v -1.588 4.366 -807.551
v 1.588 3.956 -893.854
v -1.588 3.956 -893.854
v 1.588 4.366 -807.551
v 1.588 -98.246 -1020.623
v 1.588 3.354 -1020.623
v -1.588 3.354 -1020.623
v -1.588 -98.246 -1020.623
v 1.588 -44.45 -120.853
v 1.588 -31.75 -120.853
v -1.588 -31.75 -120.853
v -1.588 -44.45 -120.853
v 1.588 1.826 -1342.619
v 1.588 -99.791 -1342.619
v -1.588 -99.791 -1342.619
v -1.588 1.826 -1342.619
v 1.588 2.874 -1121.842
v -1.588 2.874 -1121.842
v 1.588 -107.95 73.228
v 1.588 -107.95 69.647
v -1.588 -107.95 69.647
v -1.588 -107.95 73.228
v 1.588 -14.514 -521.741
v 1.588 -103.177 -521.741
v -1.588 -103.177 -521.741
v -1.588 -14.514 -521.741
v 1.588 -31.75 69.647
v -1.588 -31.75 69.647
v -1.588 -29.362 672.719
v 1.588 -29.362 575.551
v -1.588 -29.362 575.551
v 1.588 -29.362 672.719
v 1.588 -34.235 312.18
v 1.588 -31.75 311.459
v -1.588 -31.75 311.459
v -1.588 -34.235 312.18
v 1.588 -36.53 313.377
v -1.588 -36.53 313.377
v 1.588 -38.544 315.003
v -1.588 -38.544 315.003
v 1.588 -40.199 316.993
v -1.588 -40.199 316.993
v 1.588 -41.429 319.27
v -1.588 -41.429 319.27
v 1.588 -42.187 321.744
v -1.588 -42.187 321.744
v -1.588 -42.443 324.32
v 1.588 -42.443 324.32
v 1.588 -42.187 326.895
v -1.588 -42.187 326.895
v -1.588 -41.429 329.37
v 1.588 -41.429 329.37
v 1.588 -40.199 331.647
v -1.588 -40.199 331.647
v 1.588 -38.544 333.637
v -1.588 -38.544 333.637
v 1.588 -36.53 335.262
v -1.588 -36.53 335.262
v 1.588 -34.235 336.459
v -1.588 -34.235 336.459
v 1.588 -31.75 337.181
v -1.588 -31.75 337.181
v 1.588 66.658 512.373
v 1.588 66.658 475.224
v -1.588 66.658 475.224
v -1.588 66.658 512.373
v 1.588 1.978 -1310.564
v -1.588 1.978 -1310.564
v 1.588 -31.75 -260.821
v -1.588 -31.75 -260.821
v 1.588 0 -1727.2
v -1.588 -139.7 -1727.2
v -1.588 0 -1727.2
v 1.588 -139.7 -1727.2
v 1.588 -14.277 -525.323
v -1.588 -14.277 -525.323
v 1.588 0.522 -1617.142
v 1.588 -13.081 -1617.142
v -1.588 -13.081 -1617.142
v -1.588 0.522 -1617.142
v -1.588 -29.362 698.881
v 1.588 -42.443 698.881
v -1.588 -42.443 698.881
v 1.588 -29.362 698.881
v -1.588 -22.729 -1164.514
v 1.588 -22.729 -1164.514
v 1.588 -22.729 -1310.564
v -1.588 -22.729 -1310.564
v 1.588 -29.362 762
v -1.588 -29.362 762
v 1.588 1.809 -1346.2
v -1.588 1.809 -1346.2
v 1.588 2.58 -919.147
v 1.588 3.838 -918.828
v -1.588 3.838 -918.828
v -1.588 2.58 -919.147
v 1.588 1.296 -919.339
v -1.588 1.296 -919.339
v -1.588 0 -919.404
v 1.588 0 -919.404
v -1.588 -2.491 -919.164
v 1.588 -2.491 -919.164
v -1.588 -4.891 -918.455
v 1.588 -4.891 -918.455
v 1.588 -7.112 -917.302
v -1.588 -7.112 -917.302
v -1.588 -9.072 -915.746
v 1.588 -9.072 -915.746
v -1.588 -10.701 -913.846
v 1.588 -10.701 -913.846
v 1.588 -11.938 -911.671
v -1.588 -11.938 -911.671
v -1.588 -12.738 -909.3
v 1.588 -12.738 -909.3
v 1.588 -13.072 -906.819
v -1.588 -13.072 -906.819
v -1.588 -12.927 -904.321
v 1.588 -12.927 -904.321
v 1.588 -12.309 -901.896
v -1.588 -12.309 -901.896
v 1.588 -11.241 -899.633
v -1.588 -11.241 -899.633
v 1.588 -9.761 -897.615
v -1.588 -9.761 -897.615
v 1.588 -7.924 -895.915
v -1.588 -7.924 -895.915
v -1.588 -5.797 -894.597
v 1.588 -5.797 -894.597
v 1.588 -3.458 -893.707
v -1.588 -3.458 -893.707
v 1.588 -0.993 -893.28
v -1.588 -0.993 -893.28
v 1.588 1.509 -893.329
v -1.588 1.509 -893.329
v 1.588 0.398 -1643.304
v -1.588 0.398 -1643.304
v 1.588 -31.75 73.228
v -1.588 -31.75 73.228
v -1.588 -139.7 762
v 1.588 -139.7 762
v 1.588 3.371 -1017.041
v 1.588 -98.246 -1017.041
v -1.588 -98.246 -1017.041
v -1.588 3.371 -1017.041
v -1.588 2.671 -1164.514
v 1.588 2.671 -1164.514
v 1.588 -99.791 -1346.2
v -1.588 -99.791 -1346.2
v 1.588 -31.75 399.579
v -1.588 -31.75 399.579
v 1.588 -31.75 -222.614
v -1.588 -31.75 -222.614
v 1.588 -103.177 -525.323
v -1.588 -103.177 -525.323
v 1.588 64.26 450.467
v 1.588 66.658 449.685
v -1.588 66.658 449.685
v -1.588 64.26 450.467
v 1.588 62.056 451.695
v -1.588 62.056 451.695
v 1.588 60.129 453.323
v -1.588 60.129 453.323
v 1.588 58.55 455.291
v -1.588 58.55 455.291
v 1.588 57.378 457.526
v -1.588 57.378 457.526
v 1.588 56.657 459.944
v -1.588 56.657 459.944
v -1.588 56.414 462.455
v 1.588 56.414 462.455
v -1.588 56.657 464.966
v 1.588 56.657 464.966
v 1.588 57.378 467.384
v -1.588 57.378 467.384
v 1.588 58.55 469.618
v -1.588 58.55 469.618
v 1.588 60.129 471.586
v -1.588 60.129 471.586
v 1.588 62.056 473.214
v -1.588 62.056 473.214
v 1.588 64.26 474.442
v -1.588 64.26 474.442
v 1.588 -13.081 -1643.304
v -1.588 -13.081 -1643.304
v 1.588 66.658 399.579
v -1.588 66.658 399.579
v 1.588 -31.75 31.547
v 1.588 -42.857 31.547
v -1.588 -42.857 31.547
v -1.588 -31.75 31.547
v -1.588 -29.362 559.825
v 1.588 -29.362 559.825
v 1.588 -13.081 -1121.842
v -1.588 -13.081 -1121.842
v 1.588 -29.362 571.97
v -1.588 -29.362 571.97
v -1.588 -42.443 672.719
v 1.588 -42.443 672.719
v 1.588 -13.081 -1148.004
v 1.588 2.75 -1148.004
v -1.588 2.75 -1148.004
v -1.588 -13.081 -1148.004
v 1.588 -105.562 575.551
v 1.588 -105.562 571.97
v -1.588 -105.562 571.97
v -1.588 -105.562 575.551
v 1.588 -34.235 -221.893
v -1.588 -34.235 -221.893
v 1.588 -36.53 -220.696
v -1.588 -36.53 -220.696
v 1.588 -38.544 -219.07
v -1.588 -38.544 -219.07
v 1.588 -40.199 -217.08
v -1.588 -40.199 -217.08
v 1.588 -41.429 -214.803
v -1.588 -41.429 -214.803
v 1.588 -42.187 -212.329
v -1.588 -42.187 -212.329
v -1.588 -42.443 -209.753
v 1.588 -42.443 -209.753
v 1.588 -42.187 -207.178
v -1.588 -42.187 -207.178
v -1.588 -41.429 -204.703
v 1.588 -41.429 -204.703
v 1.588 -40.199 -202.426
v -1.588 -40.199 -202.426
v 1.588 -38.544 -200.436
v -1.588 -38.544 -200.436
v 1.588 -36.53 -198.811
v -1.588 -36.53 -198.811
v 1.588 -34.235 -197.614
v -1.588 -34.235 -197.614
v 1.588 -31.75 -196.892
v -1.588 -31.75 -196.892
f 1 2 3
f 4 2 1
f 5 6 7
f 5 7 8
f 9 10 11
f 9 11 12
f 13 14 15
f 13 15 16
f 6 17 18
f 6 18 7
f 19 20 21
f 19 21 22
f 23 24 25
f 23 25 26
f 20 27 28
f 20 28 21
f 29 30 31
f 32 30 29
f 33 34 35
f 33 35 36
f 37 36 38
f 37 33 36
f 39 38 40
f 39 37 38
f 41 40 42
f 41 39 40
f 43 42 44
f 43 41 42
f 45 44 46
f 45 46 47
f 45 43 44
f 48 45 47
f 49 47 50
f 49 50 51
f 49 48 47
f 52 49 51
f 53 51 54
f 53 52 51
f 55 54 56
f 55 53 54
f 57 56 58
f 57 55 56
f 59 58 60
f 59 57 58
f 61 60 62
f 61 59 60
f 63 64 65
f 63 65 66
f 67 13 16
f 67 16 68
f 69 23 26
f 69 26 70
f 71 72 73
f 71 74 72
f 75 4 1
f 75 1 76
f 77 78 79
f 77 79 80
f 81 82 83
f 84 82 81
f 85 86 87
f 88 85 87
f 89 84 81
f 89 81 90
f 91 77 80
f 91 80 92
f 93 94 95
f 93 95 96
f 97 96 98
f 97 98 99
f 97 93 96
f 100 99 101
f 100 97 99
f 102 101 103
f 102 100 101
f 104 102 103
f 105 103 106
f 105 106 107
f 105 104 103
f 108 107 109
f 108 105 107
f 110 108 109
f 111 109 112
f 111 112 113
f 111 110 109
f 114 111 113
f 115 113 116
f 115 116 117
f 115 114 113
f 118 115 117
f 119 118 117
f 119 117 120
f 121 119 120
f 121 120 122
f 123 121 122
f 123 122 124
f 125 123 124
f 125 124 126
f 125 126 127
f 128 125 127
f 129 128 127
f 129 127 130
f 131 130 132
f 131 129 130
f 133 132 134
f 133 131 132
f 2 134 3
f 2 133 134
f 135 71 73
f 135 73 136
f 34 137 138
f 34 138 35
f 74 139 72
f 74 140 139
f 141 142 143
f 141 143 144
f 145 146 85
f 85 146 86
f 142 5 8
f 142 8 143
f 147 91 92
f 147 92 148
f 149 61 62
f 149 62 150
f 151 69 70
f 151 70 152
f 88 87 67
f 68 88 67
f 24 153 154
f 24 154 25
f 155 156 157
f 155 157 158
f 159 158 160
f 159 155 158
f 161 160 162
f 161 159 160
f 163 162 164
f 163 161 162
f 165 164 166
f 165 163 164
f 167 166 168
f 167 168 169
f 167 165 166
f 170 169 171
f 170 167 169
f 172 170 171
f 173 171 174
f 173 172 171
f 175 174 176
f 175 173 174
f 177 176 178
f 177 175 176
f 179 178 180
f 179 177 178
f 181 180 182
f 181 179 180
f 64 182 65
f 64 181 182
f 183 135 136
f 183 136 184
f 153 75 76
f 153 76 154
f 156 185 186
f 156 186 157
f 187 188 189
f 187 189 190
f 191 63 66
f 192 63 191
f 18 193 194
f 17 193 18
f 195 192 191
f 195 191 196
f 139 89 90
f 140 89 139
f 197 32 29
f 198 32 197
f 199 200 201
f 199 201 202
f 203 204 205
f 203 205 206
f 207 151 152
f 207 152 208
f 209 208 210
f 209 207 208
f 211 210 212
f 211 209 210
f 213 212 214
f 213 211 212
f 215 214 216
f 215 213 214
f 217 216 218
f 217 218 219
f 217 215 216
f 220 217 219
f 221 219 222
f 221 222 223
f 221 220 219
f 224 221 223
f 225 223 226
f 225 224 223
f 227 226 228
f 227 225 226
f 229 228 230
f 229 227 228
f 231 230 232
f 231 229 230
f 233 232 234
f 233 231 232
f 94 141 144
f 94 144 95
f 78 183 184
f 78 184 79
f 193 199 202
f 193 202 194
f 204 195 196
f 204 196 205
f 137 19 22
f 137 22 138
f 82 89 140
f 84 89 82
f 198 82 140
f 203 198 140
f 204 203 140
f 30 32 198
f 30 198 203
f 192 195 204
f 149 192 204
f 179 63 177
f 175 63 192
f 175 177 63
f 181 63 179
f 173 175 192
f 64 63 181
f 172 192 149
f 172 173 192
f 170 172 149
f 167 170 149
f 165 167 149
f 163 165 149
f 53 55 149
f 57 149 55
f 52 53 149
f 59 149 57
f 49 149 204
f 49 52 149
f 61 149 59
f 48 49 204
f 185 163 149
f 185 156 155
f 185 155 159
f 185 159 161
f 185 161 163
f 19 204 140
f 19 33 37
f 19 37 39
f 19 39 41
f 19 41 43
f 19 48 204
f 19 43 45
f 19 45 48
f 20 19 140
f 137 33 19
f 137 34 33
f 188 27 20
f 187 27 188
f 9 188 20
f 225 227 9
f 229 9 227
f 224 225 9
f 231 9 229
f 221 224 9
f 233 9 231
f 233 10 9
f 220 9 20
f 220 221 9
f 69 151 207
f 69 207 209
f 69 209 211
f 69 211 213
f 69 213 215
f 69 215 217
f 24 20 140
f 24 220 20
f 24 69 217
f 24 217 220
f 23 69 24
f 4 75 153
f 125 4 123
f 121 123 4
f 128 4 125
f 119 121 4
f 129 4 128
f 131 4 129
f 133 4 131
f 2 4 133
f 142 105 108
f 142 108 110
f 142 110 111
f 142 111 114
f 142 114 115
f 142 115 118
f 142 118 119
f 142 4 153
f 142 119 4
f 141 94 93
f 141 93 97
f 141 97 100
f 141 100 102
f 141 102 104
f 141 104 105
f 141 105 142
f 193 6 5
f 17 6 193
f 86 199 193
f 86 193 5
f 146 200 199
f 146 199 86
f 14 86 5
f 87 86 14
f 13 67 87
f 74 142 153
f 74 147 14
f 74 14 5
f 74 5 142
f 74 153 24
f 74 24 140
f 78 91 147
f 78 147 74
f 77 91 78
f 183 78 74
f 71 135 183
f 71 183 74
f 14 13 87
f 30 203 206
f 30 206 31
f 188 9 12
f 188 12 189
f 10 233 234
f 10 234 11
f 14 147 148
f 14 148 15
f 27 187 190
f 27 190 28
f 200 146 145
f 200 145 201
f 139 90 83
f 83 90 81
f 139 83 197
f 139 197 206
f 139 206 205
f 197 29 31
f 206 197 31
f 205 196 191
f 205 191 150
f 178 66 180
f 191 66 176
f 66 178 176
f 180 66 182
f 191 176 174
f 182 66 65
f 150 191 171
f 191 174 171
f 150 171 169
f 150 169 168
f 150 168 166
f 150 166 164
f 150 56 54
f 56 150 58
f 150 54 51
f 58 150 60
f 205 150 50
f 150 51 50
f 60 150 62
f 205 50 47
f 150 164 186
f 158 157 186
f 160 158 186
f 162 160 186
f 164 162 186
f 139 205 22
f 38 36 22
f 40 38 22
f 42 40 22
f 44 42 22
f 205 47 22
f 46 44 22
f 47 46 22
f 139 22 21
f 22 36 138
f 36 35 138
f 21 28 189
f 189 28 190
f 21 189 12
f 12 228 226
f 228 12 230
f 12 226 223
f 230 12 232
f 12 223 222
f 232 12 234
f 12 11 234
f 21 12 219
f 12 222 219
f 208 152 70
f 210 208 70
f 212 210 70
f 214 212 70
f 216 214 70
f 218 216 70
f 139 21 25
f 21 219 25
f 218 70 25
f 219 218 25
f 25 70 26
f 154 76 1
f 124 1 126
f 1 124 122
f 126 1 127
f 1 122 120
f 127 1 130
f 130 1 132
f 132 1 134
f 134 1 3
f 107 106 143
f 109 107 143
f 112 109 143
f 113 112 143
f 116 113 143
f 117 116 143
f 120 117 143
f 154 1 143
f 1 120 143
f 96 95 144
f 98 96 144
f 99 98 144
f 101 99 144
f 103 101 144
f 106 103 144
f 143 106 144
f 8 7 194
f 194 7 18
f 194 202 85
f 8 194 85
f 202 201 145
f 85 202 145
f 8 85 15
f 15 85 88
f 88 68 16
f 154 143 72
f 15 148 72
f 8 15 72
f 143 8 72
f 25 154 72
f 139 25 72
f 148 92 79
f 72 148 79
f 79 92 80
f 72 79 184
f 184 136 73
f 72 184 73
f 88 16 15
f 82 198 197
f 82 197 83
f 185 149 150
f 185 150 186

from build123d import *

# Parameters (mm, degrees)
BOSS_EXTRUDE1_DEPTH = 1.5875
CUT_EXTRUDE5_DEPTH  = 1733.843331241


with BuildPart() as part:
    # Sketch3 → Boss-Extrude1 (new, symmetric)
    with BuildSketch(Plane(origin=(0, 0, 0), x_dir=(0, 0, -1), z_dir=(1, 0, 0))):
        with BuildLine():
            Line((1727.2, -139.7), (1727.2, 0))
            Line((1727.2, 0), (1643.3038, 0.398291906))
            Line((1643.3038, 0.398291906), (1643.3038, -13.081))
            Line((1643.3038, -13.081), (1617.1418, -13.081))
            Line((1617.1418, -13.081), (1617.1418, 0.522494347))
            Line((1617.1418, 0.522494347), (1346.2, 1.808773415))
            Line((1346.2, 1.808773415), (1346.2, -99.791226585))
            Line((1346.2, -99.791226585), (1342.6186, -99.791226585))
            Line((1342.6186, -99.791226585), (1342.6186, 1.825775885))
            Line((1342.6186, 1.825775885), (1148.0038, 2.749697345))
            Line((1148.0038, 2.749697345), (1148.0038, -13.081))
            Line((1148.0038, -13.081), (1121.8418, -13.081))
            Line((1121.8418, -13.081), (1121.8418, 2.873899787))
            Line((1121.8418, 2.873899787), (1020.6228, 3.35443059))
            Line((1020.6228, 3.35443059), (1020.6228, -98.24556941))
            Line((1020.6228, -98.24556941), (1017.0414, -98.24556941))
            Line((1017.0414, -98.24556941), (1017.0414, 3.371433061))
            Line((1017.0414, 3.371433061), (918.828185443, 3.837694088))
            ThreePointArc((918.828185443, 3.837694088), (919.259095992, 1.94031106), (919.4038, 0))
            ThreePointArc((919.4038, 0), (904.32109725, -12.926938814), (893.85441584, 3.956255481))
            Line((893.85441584, 3.956255481), (807.550680013, 4.365977011))
            Line((807.550680013, 4.365977011), (525.3228, -14.277479423))
            Line((525.3228, -14.277479423), (525.3228, -103.177479423))
            Line((525.3228, -103.177479423), (521.7414, -103.177479423))
            Line((521.7414, -103.177479423), (521.7414, -14.514060143))
            Line((521.7414, -14.514060143), (260.820750269, -31.75))
            Line((260.820750269, -31.75), (222.61445683, -31.75))
            ThreePointArc((222.61445683, -31.75), (209.7532, -42.4434), (196.89194317, -31.75))
            Line((196.89194317, -31.75), (-69.6468, -31.75))
            Line((-69.6468, -31.75), (-69.6468, -107.95))
            Line((-69.6468, -107.95), (-73.2282, -107.95))
            Line((-73.2282, -107.95), (-73.2282, -31.75))
            Line((-73.2282, -31.75), (-311.45864317, -31.75))
            ThreePointArc((-311.45864317, -31.75), (-324.3199, -42.4434), (-337.18115683, -31.75))
            Line((-337.18115683, -31.75), (-399.579249731, -31.75))
            Line((-399.579249731, -31.75), (-399.579249731, 66.658263044))
            Line((-399.579249731, 66.658263044), (-449.685071474, 66.658263044))
            ThreePointArc((-449.685071474, 66.658263044), (-462.454755632, 56.414114736), (-475.224439789, 66.658263044))
            Line((-475.224439789, 66.658263044), (-512.373001058, 66.658263044))
            Line((-512.373001058, 66.658263044), (-559.824848458, -29.3624))
            Line((-559.824848458, -29.3624), (-571.9699, -29.3624))
            Line((-571.9699, -29.3624), (-571.9699, -105.5624))
            Line((-571.9699, -105.5624), (-575.5513, -105.5624))
            Line((-575.5513, -105.5624), (-575.5513, -29.3624))
            Line((-575.5513, -29.3624), (-672.719, -29.3624))
            Line((-672.719, -29.3624), (-672.719, -42.4434))
            Line((-672.719, -42.4434), (-698.881, -42.4434))
            Line((-698.881, -42.4434), (-698.881, -29.3624))
            Line((-698.881, -29.3624), (-762, -29.3624))
            Line((-762, -29.3624), (-762, -139.7))
            Line((-762, -139.7), (1727.2, -139.7))
        make_face()
    extrude(amount=BOSS_EXTRUDE1_DEPTH, both=True)

    # Sketch5 → Cut-Extrude5 (cut, through all)
    with BuildSketch(Plane(origin=(1.5875, 0, 0), x_dir=(0, 0, -1), z_dir=(1, 0, 0))):
        Polygon((1310.5638, -22.728682836), (1310.5638, 1.977954022), (1164.5138, 2.671317164), (1164.5138, -22.728682836), align=None)
        Polygon((120.8532, -44.45), (-31.5468, -42.857236965), (-31.5468, -31.75), (120.8532, -31.75), align=None)
    extrude(amount=-CUT_EXTRUDE5_DEPTH, mode=Mode.SUBTRACT)


solid = part.part
